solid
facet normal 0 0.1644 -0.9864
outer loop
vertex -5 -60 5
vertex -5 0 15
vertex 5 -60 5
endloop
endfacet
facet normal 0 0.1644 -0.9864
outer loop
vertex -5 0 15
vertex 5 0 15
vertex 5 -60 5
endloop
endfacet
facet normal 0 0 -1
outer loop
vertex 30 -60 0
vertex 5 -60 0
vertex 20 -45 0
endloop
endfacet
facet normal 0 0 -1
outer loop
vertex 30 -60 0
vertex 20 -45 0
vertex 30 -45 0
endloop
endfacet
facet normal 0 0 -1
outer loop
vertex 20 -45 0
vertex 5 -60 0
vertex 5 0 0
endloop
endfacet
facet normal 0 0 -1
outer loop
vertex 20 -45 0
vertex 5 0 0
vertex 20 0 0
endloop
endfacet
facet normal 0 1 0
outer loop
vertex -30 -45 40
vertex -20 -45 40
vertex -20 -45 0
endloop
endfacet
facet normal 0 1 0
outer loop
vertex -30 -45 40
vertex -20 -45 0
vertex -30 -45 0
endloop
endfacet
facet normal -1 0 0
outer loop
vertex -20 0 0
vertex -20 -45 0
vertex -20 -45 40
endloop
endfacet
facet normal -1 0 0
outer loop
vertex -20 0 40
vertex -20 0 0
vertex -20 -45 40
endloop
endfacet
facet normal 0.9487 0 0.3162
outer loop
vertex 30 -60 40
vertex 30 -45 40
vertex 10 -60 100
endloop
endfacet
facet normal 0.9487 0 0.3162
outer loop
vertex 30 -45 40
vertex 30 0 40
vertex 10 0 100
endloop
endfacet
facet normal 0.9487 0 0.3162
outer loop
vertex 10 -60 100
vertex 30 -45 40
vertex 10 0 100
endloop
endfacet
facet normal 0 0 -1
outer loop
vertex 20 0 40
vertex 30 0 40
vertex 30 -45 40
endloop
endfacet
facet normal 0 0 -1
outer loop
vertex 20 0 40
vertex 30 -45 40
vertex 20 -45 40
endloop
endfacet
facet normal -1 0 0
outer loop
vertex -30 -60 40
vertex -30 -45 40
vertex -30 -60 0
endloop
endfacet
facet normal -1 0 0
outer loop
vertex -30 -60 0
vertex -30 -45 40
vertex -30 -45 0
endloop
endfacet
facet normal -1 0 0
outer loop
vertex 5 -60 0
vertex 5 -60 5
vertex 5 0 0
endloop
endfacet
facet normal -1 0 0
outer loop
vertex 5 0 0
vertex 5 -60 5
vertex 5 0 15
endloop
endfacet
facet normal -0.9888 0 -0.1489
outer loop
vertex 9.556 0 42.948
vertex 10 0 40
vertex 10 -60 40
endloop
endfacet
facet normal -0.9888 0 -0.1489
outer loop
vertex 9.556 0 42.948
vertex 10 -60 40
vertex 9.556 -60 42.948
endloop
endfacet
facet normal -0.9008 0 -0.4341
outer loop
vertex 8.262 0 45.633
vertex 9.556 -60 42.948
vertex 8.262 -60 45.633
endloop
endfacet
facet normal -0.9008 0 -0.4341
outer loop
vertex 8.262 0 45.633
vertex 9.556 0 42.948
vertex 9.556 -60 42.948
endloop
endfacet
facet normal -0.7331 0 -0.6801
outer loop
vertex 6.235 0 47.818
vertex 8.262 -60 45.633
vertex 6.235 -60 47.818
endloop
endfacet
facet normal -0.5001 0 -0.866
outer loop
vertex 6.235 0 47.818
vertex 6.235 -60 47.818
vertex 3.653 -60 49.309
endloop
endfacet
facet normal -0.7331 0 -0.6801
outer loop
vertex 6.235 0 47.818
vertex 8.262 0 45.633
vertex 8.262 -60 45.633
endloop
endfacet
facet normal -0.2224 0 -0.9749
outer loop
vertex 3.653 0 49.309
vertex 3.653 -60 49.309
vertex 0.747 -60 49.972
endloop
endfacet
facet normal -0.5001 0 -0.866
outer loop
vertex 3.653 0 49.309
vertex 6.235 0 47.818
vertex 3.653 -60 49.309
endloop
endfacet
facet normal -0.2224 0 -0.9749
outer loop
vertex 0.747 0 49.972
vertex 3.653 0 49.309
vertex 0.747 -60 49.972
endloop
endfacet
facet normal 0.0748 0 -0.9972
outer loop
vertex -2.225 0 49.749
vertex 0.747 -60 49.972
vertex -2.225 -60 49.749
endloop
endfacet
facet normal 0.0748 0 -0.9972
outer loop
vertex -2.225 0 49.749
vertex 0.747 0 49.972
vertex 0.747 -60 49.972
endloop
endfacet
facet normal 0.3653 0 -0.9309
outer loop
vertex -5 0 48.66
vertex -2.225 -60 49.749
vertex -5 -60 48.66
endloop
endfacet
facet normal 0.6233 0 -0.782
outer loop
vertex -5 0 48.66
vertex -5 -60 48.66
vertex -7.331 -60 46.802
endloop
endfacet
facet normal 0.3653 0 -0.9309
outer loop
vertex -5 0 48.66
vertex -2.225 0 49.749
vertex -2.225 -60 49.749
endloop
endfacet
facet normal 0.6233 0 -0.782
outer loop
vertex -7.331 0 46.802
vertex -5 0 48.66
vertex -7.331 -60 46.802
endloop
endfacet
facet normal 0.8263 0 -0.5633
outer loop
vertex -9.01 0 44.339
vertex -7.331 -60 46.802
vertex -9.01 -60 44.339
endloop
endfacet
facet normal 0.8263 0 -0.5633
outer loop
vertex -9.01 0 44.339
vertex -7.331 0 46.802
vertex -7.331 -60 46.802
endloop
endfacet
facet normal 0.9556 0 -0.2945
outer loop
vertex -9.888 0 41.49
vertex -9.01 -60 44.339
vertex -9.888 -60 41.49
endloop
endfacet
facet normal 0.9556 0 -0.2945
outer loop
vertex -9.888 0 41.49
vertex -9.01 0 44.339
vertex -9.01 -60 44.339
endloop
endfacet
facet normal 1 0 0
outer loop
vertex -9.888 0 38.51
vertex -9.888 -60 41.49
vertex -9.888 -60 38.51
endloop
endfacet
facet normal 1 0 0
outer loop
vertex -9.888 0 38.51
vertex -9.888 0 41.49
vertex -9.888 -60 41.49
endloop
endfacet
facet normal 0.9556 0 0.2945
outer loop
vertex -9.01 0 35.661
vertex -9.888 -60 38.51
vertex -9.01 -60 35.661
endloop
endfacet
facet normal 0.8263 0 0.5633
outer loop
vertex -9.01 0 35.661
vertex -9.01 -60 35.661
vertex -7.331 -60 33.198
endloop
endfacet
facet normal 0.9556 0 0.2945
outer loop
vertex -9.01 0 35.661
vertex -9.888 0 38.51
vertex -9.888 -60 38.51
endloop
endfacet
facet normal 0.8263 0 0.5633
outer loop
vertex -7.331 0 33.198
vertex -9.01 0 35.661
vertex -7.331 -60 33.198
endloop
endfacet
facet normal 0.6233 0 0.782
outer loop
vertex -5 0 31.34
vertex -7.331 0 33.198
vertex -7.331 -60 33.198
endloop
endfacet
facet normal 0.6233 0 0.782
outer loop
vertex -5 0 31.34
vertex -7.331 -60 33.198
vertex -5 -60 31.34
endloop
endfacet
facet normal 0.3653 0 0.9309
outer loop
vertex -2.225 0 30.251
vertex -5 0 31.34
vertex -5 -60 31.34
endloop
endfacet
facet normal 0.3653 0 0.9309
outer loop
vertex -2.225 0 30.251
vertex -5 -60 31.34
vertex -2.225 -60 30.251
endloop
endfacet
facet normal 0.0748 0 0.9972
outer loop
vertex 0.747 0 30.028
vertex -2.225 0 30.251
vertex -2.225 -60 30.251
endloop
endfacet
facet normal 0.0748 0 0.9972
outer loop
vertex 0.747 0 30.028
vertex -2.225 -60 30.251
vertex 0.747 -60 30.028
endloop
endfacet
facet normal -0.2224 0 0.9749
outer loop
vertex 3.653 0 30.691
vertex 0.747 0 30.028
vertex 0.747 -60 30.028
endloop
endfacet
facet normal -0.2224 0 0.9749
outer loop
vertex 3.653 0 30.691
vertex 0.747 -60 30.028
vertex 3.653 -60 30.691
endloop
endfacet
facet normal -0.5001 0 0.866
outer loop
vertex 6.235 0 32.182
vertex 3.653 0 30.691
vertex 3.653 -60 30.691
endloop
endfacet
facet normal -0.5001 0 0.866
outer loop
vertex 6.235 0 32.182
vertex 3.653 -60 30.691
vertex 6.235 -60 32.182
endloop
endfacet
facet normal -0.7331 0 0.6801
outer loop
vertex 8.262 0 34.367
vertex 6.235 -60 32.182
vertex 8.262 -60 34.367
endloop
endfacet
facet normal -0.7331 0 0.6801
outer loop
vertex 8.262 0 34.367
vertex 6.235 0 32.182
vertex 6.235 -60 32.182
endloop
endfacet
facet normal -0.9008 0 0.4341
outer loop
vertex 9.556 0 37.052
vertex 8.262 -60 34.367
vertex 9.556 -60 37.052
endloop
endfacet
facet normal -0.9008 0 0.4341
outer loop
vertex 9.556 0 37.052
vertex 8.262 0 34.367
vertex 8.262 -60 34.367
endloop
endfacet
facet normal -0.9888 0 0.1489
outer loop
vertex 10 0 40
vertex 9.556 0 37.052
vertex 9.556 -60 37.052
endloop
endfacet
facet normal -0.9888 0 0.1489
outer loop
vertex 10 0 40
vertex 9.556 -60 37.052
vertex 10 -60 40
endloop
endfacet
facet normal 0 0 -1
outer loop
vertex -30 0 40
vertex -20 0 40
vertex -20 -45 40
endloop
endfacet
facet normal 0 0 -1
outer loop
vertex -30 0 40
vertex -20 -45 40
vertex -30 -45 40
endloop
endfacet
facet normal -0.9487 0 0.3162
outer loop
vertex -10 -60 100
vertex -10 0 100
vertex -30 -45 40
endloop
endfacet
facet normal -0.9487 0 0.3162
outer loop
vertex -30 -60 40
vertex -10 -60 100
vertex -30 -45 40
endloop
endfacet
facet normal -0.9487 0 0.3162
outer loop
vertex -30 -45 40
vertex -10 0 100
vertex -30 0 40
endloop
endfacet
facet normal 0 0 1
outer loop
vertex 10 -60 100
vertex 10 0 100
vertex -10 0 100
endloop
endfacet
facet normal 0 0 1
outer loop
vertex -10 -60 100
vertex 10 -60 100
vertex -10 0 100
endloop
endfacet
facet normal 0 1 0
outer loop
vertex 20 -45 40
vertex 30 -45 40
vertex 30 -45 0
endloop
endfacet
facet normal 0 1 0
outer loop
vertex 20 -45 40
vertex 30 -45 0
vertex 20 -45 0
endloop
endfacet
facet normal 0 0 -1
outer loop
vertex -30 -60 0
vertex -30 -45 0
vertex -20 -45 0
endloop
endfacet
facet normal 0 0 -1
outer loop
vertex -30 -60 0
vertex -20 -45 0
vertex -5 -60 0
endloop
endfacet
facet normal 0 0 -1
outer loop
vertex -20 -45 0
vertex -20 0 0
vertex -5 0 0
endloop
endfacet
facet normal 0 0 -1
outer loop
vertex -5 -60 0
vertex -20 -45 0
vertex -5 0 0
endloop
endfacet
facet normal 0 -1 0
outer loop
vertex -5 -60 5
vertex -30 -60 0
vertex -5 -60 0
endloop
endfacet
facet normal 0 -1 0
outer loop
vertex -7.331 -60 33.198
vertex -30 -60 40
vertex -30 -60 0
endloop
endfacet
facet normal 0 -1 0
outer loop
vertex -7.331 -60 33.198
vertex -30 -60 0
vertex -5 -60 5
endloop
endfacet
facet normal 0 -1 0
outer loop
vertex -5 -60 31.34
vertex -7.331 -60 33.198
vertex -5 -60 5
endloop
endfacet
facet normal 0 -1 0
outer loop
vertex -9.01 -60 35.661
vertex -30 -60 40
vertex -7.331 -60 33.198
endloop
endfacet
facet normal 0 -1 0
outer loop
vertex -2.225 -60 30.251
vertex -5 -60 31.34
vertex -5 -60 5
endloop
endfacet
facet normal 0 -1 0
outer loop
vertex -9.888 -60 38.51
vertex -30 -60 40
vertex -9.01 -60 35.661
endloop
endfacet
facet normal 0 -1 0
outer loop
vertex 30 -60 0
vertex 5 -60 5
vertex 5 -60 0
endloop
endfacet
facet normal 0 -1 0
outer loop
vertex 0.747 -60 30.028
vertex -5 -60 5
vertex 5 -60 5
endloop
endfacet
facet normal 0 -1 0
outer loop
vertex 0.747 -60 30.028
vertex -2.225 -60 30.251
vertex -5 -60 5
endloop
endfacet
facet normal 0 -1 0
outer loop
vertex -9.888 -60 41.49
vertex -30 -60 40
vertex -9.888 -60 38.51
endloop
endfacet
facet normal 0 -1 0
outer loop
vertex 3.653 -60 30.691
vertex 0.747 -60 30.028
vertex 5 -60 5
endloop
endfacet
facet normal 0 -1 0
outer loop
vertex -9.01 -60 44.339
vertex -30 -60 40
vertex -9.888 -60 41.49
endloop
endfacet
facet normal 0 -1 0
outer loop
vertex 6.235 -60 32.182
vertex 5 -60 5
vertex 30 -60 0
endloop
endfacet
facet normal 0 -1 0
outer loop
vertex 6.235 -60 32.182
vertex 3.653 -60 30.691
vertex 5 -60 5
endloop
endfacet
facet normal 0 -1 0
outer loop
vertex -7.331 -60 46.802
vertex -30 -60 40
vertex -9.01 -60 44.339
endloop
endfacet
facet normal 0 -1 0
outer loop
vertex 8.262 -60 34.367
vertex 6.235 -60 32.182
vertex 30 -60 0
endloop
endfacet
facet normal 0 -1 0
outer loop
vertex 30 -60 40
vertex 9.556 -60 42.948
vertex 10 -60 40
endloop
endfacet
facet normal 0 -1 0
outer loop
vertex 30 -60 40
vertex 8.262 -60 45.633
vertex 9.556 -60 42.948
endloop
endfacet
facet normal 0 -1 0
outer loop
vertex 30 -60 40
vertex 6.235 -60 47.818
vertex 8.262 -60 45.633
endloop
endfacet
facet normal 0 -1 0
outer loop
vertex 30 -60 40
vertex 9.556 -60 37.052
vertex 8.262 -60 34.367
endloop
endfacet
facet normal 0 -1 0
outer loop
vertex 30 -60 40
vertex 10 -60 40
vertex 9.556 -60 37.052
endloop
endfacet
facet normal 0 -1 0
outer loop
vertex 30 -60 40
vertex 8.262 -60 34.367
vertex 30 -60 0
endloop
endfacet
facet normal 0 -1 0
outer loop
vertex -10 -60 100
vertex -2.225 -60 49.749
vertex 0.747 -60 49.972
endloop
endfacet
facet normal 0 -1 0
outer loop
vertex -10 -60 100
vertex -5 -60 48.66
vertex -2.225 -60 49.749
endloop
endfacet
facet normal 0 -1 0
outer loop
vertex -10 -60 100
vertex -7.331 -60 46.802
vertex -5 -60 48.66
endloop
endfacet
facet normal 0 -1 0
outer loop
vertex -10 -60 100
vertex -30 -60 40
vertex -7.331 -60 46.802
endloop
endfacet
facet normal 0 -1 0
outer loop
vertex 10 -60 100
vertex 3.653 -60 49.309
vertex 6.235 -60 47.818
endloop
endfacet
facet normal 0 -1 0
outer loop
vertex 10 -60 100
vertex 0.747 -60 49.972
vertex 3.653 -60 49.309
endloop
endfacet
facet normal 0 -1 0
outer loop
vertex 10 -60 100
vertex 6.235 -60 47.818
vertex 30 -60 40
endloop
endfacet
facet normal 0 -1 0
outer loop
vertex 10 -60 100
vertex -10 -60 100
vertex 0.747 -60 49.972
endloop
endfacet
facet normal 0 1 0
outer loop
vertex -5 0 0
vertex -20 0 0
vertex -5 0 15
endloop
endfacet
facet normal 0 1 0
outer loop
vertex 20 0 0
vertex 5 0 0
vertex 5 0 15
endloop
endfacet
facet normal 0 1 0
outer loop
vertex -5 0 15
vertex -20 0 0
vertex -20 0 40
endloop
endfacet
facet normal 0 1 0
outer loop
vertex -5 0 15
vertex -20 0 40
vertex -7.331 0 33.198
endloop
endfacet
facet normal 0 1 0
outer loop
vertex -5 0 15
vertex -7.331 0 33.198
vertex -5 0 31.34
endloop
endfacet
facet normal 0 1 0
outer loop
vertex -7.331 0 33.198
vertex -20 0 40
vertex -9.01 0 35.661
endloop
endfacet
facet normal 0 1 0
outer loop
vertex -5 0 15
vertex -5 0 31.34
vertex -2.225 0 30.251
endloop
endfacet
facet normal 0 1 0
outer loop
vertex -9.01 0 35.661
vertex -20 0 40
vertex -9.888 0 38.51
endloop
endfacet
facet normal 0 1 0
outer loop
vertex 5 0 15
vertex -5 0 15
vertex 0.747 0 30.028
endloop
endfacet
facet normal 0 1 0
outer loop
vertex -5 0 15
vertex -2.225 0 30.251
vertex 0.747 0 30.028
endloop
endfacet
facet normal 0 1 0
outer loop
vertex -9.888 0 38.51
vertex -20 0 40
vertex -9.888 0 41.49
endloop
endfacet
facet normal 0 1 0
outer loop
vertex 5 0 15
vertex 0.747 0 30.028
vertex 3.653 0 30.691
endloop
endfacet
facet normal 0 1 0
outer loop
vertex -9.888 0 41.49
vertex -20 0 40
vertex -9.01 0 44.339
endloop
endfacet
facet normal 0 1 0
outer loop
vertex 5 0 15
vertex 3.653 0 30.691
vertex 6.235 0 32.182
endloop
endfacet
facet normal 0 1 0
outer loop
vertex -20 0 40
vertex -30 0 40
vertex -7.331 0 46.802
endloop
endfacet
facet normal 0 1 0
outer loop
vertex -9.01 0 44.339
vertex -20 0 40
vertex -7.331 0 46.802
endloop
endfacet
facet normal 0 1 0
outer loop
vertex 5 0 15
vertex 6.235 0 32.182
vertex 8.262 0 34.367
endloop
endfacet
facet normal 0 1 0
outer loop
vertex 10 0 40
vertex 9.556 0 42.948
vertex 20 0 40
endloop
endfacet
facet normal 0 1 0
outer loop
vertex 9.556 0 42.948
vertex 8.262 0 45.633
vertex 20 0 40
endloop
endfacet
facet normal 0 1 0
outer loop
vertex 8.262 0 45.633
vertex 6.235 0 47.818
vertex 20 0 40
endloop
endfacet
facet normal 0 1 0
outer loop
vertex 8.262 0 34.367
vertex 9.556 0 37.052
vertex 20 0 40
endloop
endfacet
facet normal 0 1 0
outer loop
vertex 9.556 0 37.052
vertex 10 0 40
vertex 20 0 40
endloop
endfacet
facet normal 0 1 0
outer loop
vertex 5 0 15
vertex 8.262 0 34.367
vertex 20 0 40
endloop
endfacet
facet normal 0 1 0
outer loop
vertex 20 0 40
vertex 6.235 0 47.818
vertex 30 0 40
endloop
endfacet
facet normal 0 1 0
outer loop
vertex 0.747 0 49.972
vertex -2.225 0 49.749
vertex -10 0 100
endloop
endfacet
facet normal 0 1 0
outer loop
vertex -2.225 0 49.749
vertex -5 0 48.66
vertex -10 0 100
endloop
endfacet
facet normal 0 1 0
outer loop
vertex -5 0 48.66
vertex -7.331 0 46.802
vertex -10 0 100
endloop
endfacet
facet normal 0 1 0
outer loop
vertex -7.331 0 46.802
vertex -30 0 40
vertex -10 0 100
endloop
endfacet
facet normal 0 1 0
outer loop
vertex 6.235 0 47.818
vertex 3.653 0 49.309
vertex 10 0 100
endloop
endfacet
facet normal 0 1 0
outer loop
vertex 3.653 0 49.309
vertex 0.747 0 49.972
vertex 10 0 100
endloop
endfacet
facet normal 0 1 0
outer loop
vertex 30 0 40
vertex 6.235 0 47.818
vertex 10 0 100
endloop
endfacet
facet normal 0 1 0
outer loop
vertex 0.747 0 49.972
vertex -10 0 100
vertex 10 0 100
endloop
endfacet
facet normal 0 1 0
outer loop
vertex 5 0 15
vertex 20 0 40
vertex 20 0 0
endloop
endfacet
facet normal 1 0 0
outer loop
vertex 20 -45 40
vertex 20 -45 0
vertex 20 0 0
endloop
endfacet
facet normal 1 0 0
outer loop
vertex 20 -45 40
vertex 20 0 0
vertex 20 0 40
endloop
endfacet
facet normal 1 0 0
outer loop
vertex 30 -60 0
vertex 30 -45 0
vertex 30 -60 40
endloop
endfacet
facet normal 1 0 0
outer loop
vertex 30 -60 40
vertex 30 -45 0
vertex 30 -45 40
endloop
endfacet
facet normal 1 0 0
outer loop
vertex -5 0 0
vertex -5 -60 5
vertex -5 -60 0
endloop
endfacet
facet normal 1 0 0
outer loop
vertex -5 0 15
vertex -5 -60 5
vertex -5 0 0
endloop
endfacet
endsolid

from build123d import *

# Parameters (mm, degrees)
F0_R     = 10
F1_DEPTH = 60
F2_W     = 10
F2_H     = 40
F3_DEPTH = 45
F5_DEPTH = 5


with BuildPart() as f1:
    # F0 (on Front) → F1 (new body)
    with BuildSketch(Plane.XZ):
        Polygon((-30, 40), (-30, 0), (30, 0), (30, 40), (10, 100), (-10, 100), align=None)
        with Locations((0, 40)):
            Circle(F0_R, mode=Mode.SUBTRACT)
    extrude(amount=F1_DEPTH)

    # F2 (on face) → F3 (cut)
    with BuildSketch(Plane(origin=(0, 0, 0), x_dir=(-1, 0, 0), z_dir=(0, 1, 0))):
        with Locations((25, 20)):
            Rectangle(F2_W, F2_H)
        with Locations((-25, 20)):
            Rectangle(F2_W, F2_H)
    extrude(amount=-F3_DEPTH, mode=Mode.SUBTRACT)

    # F4 (on Right) → F5 (cut, symmetric)
    with BuildSketch(Plane.YZ):
        Polygon((-60, 5), (-60, 0), (-45, 0), (0, 0), (0, 15), align=None)
    extrude(amount=F5_DEPTH, both=True, mode=Mode.SUBTRACT)


solid = f1.part
